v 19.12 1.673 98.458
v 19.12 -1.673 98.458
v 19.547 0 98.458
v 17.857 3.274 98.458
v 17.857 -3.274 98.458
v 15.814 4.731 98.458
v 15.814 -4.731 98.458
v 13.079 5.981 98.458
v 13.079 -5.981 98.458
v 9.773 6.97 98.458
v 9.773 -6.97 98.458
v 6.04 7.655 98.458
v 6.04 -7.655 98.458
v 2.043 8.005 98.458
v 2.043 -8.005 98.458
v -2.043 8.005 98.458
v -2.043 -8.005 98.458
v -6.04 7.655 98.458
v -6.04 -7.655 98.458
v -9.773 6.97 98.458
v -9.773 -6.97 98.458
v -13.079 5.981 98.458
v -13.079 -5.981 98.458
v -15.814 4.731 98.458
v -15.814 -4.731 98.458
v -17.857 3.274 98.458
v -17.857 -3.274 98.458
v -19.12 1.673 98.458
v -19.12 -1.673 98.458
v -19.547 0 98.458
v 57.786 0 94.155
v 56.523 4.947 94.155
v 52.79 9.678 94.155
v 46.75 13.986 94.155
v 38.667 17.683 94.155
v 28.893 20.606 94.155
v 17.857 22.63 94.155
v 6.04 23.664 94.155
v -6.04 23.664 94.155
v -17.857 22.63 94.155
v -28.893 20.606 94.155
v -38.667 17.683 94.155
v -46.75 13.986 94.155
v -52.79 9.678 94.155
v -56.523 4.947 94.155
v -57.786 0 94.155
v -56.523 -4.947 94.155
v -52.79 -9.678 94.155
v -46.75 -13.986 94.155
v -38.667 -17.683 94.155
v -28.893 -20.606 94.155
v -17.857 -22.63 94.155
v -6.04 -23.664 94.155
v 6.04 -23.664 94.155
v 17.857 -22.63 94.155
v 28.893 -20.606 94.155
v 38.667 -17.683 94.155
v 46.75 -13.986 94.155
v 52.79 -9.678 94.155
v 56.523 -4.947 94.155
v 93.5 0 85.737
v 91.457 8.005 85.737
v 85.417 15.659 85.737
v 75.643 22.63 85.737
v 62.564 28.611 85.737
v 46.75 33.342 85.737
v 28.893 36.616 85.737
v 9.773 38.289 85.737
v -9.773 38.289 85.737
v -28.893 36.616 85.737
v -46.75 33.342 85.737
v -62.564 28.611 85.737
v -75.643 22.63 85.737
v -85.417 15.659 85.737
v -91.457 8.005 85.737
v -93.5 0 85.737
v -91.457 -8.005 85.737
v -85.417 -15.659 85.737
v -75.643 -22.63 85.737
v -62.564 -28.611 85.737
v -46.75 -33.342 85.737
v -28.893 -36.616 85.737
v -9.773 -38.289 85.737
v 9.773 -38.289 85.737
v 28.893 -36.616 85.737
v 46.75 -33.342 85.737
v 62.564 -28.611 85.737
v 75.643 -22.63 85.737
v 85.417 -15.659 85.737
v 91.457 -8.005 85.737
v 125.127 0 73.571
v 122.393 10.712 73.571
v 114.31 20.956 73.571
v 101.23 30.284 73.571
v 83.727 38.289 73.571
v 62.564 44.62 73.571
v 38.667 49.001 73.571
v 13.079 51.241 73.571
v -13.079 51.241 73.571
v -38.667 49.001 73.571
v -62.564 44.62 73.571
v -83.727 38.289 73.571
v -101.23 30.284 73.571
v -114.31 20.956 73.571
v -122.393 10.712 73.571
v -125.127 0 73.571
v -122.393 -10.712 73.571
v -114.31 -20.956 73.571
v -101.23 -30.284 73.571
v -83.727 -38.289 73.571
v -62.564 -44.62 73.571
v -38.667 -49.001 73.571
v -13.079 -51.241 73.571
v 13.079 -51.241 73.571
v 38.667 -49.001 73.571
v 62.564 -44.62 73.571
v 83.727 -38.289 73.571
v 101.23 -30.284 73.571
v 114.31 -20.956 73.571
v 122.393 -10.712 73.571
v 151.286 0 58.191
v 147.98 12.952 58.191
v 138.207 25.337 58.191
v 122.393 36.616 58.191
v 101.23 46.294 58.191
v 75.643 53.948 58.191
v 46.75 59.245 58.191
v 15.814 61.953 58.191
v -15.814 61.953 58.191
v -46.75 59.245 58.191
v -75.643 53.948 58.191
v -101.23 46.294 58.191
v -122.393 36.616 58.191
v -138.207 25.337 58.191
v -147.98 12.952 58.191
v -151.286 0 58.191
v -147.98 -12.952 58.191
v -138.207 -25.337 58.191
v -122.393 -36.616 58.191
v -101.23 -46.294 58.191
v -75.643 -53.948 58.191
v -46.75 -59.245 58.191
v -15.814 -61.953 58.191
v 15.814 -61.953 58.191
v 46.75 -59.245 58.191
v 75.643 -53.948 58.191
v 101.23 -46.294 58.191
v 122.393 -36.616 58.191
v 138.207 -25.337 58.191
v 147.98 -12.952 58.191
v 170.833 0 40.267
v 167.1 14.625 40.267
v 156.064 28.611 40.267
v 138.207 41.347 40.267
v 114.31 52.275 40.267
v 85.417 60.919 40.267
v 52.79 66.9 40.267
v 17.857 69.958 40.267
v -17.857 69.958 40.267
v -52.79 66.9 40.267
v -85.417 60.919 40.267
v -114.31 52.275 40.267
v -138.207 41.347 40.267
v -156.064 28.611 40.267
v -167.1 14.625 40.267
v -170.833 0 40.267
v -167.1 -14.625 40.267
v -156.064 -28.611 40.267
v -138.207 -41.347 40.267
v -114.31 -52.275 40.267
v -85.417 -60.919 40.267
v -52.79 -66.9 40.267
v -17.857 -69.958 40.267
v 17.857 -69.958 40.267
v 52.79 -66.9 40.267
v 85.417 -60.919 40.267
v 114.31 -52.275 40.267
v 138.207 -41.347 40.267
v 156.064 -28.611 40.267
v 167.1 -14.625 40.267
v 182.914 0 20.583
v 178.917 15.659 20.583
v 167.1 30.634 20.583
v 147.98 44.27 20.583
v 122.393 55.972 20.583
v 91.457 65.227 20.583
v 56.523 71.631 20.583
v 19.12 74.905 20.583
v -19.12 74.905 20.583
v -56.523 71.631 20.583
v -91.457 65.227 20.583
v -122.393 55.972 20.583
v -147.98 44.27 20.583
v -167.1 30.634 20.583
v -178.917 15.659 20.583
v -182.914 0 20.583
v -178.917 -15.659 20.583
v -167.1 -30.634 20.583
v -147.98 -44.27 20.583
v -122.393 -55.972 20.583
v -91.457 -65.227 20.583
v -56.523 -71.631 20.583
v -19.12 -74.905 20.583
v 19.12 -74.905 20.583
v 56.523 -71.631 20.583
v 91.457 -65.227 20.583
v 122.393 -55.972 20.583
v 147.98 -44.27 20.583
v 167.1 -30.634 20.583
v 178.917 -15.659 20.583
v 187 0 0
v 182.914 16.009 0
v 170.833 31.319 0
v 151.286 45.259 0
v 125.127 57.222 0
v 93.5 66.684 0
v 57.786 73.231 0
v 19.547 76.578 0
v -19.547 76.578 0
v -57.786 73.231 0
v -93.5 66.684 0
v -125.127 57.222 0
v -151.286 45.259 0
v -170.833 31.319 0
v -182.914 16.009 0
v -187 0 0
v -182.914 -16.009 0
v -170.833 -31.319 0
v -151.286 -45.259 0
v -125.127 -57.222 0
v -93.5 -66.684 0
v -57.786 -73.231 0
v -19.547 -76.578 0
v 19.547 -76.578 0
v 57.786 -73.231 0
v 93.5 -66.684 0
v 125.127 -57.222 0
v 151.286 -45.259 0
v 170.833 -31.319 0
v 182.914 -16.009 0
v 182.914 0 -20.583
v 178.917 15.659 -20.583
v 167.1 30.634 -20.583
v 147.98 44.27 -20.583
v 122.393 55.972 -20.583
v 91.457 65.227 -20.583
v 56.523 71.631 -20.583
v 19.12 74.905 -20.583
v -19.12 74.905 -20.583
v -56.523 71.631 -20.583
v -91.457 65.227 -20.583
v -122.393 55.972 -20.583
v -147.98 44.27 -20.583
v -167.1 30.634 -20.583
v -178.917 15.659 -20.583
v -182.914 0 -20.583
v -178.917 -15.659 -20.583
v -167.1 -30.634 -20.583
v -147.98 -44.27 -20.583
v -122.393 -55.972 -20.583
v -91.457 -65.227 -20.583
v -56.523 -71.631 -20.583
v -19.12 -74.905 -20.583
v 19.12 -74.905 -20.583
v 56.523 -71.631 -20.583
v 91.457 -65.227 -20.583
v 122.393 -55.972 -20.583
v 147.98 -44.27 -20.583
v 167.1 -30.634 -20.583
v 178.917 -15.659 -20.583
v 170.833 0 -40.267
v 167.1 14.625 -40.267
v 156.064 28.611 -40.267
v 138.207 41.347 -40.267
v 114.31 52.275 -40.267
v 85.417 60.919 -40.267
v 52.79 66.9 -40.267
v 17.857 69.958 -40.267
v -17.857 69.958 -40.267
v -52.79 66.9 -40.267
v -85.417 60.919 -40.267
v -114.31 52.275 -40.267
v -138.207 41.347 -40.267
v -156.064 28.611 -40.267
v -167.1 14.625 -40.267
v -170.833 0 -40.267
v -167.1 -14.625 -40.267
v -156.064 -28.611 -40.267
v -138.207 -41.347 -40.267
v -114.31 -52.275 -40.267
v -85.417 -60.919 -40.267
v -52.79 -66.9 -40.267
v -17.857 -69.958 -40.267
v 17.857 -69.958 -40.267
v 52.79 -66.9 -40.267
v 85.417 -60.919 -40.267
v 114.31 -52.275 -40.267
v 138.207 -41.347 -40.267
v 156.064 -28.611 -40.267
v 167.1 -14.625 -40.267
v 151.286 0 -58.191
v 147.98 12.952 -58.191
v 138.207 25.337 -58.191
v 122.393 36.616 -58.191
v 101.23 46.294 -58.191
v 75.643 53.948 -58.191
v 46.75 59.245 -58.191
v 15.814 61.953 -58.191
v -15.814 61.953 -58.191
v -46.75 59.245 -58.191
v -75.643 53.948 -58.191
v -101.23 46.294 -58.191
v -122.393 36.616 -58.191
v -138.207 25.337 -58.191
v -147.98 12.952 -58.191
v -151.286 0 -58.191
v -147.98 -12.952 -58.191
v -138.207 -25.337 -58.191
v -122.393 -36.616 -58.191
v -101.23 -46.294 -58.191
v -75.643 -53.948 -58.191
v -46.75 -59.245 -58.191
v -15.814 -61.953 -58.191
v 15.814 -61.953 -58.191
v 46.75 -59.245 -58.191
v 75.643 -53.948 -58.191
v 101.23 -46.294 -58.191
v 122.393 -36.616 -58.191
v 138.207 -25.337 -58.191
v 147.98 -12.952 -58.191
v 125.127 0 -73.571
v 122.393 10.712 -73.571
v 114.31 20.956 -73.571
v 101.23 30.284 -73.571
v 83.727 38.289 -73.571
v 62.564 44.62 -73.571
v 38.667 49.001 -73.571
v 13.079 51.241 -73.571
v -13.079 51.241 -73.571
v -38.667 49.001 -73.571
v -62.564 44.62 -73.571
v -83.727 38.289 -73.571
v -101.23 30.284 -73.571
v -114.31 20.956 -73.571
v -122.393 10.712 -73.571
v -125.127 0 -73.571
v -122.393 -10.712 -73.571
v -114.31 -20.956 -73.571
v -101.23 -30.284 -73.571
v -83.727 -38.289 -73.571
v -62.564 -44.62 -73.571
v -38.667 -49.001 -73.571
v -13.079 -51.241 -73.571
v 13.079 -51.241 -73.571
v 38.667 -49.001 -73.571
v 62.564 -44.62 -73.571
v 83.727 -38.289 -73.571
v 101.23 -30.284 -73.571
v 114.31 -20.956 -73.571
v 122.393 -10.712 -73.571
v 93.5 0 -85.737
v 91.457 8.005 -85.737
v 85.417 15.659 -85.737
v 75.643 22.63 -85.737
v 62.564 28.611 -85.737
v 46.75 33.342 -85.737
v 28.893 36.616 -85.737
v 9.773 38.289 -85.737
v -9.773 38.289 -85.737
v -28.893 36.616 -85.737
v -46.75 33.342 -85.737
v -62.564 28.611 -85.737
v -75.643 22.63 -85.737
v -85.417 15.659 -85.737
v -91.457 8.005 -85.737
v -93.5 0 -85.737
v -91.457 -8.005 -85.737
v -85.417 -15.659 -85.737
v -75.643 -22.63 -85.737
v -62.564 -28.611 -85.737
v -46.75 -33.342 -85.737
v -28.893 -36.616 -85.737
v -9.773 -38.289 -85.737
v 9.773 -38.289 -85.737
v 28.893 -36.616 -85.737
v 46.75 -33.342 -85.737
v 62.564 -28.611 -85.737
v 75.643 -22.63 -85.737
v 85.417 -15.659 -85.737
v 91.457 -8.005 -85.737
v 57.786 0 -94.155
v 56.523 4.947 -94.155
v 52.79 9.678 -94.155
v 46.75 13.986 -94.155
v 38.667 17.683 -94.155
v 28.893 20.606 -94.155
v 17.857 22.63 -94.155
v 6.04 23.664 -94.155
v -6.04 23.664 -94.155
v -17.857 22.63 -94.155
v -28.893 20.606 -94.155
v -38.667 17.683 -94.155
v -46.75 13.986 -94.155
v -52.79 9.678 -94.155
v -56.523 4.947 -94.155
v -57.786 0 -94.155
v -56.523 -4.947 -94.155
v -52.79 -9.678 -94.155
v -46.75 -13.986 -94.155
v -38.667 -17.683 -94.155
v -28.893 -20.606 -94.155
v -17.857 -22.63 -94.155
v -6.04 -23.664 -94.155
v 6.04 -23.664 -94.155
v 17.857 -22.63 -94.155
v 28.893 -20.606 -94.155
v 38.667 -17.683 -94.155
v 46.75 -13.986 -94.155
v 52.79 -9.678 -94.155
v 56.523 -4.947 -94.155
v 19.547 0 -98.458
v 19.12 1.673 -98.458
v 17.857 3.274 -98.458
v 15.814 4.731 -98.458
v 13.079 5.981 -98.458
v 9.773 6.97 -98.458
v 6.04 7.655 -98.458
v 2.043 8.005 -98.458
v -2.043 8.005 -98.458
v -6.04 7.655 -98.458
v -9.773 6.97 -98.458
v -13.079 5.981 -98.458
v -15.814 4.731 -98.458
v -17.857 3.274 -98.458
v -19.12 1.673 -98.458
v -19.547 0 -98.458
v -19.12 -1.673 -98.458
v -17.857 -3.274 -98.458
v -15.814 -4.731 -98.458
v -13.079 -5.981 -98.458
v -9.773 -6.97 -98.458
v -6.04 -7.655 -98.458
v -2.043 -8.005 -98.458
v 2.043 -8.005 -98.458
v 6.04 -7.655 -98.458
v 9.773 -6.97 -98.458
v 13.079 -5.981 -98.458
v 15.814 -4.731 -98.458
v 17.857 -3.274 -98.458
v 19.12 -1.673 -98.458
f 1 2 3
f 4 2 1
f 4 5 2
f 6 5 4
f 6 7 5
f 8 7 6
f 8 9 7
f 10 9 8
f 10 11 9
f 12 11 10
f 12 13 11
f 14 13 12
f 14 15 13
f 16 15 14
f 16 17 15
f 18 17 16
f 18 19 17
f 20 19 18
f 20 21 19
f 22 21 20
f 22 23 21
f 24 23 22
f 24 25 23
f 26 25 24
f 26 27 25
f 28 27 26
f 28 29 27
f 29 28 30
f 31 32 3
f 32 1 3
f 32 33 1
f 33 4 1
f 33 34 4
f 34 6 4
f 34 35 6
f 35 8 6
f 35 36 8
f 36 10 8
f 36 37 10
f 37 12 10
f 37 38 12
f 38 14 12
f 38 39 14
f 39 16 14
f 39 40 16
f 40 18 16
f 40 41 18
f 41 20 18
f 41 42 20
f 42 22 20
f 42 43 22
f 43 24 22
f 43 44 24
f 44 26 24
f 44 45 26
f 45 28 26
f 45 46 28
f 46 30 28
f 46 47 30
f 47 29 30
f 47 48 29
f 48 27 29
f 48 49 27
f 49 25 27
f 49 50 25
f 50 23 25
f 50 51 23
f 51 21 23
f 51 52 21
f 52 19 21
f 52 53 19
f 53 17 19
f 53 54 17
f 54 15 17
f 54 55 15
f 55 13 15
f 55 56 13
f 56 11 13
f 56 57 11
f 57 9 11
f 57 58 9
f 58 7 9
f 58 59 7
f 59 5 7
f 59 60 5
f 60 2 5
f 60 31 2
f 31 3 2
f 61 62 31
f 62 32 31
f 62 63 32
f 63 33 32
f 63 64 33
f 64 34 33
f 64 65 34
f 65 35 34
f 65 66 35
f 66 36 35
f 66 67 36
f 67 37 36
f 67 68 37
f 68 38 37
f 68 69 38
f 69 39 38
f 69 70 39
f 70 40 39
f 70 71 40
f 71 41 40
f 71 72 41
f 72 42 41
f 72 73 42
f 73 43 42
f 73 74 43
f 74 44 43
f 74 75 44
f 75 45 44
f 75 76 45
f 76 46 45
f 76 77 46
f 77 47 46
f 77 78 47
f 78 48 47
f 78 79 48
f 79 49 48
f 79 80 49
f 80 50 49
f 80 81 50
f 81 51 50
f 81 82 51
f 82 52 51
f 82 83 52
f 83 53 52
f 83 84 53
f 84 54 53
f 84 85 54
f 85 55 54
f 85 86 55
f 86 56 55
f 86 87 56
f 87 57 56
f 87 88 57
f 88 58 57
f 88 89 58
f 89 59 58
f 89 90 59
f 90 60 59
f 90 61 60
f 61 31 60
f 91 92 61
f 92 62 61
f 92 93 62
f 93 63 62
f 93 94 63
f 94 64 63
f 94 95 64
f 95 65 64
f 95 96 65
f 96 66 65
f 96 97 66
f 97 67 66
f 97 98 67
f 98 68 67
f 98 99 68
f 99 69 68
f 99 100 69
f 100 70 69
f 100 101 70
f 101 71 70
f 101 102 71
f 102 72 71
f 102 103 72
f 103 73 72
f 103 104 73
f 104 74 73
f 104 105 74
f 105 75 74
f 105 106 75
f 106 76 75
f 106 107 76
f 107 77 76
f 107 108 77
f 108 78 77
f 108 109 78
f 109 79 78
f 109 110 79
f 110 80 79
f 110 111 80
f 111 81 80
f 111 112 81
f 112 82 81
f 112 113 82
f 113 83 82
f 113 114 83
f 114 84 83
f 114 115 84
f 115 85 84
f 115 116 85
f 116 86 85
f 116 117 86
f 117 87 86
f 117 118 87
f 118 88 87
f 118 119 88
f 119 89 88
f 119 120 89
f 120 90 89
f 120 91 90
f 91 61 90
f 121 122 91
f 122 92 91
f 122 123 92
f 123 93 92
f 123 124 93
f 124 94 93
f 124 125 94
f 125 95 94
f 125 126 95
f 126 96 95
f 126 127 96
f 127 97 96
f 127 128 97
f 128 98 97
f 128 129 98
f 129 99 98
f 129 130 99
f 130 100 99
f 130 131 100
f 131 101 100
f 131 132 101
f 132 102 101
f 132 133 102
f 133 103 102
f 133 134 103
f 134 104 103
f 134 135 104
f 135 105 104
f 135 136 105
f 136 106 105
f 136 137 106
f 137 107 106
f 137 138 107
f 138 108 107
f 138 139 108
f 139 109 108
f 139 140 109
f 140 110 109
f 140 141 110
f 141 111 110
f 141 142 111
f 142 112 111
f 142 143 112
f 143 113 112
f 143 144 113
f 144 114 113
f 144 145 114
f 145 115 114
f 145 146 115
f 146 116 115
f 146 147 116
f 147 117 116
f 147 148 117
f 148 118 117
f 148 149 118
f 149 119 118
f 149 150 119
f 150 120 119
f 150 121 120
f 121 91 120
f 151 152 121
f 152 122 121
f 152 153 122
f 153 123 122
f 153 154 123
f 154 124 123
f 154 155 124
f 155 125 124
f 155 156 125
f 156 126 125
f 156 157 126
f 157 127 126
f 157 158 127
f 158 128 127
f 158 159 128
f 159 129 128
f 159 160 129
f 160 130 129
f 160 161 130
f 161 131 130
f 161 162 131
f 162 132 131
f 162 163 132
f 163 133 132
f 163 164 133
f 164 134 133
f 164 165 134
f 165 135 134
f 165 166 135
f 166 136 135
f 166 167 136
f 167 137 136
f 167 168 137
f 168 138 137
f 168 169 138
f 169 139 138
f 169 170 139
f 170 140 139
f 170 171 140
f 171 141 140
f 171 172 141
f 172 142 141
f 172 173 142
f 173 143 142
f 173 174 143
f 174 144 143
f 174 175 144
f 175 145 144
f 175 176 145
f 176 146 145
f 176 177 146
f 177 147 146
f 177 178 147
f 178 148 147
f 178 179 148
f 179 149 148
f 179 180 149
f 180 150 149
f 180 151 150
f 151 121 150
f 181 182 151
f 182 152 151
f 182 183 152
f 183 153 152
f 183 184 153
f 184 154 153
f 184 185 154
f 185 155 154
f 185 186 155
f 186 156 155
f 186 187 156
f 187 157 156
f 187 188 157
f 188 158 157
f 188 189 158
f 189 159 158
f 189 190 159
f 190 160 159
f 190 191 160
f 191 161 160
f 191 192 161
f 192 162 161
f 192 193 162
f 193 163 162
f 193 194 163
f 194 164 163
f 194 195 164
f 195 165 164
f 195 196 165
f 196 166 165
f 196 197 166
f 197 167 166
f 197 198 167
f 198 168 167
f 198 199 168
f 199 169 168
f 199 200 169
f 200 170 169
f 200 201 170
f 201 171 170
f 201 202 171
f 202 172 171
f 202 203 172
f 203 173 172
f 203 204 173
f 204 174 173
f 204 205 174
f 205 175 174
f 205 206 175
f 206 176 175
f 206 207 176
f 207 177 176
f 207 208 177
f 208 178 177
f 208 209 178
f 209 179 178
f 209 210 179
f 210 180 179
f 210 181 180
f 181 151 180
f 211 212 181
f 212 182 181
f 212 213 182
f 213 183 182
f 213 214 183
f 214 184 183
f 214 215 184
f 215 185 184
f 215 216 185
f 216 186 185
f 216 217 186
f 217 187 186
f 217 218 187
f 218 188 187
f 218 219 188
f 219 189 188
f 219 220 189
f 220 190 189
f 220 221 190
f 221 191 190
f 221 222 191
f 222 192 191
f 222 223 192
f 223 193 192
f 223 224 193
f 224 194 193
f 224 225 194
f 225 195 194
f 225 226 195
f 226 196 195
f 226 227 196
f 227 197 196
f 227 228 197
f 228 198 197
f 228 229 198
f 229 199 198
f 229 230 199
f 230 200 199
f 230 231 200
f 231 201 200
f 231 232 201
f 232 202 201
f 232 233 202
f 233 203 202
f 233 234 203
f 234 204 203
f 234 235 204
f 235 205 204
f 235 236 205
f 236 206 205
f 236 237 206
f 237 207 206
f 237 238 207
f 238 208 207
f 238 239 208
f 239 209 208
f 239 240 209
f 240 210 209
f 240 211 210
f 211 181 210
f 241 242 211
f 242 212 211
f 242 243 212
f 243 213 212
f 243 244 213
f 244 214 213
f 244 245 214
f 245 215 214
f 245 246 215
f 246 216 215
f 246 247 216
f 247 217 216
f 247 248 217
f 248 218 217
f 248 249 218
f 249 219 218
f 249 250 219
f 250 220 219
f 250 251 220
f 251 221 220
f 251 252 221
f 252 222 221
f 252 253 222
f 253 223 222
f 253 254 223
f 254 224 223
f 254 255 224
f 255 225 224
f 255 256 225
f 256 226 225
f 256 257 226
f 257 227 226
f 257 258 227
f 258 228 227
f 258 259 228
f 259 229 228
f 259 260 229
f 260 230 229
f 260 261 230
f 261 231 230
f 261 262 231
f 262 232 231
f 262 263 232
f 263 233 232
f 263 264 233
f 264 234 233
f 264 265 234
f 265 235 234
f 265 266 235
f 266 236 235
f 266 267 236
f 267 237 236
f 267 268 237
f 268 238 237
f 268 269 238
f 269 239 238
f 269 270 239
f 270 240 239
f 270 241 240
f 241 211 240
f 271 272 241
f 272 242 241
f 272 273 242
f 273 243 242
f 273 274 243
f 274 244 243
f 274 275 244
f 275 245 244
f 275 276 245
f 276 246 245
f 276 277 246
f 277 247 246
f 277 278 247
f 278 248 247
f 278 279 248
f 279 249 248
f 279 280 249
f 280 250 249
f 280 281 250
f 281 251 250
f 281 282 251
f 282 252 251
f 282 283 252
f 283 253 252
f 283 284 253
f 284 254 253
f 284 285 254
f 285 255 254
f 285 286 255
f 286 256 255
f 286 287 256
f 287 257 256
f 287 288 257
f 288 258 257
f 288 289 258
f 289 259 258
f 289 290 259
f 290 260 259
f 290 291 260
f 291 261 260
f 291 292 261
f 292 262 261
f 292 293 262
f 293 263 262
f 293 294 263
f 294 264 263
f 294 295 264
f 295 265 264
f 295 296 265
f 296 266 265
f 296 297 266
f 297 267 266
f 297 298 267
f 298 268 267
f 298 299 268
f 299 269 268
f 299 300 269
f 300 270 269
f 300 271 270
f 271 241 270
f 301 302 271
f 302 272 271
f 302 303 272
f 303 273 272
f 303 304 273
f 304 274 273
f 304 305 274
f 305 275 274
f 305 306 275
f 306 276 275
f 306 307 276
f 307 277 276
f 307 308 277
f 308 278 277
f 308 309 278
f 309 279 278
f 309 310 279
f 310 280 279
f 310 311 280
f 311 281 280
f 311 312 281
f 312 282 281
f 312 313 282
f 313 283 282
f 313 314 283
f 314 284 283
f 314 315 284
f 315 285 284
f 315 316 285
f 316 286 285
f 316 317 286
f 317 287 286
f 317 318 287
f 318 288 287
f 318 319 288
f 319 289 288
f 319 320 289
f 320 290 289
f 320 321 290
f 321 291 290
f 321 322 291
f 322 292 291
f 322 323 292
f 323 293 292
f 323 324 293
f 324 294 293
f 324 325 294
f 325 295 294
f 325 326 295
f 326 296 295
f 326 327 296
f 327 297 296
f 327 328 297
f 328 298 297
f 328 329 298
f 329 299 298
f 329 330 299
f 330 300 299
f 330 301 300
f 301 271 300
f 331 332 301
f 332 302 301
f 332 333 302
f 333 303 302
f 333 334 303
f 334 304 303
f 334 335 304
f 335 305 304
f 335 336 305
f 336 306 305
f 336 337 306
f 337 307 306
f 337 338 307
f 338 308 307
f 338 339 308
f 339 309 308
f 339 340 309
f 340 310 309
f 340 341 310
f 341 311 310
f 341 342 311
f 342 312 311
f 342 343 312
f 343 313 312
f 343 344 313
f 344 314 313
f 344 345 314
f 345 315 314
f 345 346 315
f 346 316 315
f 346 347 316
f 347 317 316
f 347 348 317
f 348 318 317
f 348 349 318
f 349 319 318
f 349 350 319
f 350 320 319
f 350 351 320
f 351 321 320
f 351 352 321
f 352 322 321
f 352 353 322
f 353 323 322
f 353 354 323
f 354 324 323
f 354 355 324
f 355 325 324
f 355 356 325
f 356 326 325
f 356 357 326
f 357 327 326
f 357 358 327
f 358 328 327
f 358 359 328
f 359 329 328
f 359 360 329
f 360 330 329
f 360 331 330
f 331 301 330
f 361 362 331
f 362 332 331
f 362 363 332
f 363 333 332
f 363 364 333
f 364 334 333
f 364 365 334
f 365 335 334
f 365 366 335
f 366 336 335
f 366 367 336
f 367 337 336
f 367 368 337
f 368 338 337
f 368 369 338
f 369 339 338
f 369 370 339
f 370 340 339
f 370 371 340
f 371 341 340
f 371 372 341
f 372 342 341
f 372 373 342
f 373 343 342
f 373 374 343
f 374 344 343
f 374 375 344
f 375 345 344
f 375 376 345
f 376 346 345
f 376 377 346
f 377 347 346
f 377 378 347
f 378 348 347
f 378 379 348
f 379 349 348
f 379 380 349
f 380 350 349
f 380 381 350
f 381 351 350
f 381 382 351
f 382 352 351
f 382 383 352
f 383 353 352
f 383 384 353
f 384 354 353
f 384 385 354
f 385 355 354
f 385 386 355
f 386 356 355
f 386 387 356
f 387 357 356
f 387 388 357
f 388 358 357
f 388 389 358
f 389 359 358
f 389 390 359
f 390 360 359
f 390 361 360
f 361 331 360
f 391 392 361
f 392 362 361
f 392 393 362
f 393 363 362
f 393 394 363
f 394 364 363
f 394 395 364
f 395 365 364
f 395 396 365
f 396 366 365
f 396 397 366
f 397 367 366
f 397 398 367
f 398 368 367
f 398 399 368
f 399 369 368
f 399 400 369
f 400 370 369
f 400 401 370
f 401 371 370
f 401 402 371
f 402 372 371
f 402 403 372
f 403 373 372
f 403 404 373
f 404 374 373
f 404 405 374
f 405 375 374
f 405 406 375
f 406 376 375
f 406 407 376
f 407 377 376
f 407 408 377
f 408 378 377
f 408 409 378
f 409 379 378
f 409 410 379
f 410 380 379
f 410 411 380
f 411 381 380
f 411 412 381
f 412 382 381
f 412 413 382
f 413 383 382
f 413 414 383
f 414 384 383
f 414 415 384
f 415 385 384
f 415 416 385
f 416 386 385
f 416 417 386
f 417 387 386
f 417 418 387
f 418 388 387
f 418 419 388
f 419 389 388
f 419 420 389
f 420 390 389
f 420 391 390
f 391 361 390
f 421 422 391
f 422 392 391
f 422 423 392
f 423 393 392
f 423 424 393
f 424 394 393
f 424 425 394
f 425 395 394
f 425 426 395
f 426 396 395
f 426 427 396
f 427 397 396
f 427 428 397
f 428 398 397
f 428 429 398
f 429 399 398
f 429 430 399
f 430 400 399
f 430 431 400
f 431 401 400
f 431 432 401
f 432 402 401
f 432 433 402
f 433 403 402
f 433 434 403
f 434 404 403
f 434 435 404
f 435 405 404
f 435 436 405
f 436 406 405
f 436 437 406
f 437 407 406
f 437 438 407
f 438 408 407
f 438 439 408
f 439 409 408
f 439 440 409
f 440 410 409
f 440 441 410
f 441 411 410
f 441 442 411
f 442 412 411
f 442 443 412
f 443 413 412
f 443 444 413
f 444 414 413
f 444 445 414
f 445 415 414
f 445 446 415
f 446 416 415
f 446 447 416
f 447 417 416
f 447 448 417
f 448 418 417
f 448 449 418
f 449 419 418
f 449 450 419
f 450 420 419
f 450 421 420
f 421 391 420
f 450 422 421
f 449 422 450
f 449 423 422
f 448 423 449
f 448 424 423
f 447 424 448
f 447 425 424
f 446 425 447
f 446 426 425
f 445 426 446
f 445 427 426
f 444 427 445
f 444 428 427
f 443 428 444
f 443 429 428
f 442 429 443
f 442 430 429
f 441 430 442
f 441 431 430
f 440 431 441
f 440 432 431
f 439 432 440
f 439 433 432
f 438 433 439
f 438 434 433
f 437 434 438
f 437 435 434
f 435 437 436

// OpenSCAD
// Generated by SolidPython 1.0.1 on 2020-07-29 00:46:52


scale(v = [17, 7, 9]) {
	sphere(r = 11);
}
/***********************************************
*********      SolidPython code:      **********
************************************************
 
# import packages: SolidPython
from solid import *
from solid.utils import *
from itertools import chain, combinations, permutations


class Resize:

    def __init__(self, scad_file):
        self.scad_file = scad_file
        #self.scad_file = import_scad(scad_file)
        # cone/cylinder param:
        self.r1 = 0
        self.r2 = 0
        self.h = 0
        # rectangular prism param:
        self.w = 0
        self.l = 0
        # ellipse param:
        self.r = 0

    # import OpenScad code (file name corresponds to shape)


    # classify shape + parameters
    def assign(self, param1, param2, param3):
        if self.scad_file == 'cone.scad':
            self.r1 = param1
            self.r2 = param2
            self.h = param3
        elif self.scad_file == 'cylinder.scad':
            self.r1 = param1
            self.r2 = param2
            self.h = param3
        elif self.scad_file == 'rectangularPrism.scad':
            self.h = param1
            self.l = param2
            self.w = param3
        else:
            self.r = param1
            self.h = param2

    # resize parameters
    def iterate(self):
        x = range(3, 20, 2)
        i = 1
        if self.scad_file == 'cone.scad':
            tempList = list(permutations(x, 2))
            for temp in tempList:
                param1 = temp[0]
                param2 = temp[1]
                filepath = 'produced_scad_files/' + 'cone' + str(param1) + '_' + str(param2) + '_' + '.scad'
                scad_render_to_file(cylinder(h=param1, r1=param2, r2=0), filepath)

        elif self.scad_file == 'cylinder.scad':
            tempList = list(permutations(x, 3))
            for temp in tempList:
                param1 = temp[0]
                param2 = temp[1]
                filepath = 'produced_scad_files/' + 'cylinder' + str(param1) + '_' + str(param2) + '_' + '.scad'
                scad_render_to_file(cylinder(h=param1, r1=param2, r2=param2), filepath)

        elif self.scad_file == 'rectangularPrism.scad':
            tempList = list(permutations(x, 3))
            for temp in tempList:
                param1 = temp[0]
                param2 = temp[1]
                param3 = temp[2]
                filepath = 'produced_scad_files/' + 'rectangularPrism' + str(param1) + '_' + str(param2) + '_' + str(
                    param3) + '.scad'
                scad_render_to_file(cube(size=(param1, param2, param3)), filepath)

        elif self.scad_file == 'ellipse.scad':
            tempList = list(permutations(x, 4))
            for temp in tempList:
                param1 = temp[0]
                param2 = temp[1]
                param3 = temp[2]
                param4 = temp[3]
                filepath = 'produced_scad_files/' + 'ellipse' + str(param1) + '_' + str(param2) + '_' + str(param3) + '_' + str(param4) + '.scad'
                scad_render_to_file(scale([param1, param2, param3])(sphere(r=param4)), filepath)

    def render_to_scadfile(self):
        scad_render_to_file(scad, 'example.scad') 
 
************************************************/
